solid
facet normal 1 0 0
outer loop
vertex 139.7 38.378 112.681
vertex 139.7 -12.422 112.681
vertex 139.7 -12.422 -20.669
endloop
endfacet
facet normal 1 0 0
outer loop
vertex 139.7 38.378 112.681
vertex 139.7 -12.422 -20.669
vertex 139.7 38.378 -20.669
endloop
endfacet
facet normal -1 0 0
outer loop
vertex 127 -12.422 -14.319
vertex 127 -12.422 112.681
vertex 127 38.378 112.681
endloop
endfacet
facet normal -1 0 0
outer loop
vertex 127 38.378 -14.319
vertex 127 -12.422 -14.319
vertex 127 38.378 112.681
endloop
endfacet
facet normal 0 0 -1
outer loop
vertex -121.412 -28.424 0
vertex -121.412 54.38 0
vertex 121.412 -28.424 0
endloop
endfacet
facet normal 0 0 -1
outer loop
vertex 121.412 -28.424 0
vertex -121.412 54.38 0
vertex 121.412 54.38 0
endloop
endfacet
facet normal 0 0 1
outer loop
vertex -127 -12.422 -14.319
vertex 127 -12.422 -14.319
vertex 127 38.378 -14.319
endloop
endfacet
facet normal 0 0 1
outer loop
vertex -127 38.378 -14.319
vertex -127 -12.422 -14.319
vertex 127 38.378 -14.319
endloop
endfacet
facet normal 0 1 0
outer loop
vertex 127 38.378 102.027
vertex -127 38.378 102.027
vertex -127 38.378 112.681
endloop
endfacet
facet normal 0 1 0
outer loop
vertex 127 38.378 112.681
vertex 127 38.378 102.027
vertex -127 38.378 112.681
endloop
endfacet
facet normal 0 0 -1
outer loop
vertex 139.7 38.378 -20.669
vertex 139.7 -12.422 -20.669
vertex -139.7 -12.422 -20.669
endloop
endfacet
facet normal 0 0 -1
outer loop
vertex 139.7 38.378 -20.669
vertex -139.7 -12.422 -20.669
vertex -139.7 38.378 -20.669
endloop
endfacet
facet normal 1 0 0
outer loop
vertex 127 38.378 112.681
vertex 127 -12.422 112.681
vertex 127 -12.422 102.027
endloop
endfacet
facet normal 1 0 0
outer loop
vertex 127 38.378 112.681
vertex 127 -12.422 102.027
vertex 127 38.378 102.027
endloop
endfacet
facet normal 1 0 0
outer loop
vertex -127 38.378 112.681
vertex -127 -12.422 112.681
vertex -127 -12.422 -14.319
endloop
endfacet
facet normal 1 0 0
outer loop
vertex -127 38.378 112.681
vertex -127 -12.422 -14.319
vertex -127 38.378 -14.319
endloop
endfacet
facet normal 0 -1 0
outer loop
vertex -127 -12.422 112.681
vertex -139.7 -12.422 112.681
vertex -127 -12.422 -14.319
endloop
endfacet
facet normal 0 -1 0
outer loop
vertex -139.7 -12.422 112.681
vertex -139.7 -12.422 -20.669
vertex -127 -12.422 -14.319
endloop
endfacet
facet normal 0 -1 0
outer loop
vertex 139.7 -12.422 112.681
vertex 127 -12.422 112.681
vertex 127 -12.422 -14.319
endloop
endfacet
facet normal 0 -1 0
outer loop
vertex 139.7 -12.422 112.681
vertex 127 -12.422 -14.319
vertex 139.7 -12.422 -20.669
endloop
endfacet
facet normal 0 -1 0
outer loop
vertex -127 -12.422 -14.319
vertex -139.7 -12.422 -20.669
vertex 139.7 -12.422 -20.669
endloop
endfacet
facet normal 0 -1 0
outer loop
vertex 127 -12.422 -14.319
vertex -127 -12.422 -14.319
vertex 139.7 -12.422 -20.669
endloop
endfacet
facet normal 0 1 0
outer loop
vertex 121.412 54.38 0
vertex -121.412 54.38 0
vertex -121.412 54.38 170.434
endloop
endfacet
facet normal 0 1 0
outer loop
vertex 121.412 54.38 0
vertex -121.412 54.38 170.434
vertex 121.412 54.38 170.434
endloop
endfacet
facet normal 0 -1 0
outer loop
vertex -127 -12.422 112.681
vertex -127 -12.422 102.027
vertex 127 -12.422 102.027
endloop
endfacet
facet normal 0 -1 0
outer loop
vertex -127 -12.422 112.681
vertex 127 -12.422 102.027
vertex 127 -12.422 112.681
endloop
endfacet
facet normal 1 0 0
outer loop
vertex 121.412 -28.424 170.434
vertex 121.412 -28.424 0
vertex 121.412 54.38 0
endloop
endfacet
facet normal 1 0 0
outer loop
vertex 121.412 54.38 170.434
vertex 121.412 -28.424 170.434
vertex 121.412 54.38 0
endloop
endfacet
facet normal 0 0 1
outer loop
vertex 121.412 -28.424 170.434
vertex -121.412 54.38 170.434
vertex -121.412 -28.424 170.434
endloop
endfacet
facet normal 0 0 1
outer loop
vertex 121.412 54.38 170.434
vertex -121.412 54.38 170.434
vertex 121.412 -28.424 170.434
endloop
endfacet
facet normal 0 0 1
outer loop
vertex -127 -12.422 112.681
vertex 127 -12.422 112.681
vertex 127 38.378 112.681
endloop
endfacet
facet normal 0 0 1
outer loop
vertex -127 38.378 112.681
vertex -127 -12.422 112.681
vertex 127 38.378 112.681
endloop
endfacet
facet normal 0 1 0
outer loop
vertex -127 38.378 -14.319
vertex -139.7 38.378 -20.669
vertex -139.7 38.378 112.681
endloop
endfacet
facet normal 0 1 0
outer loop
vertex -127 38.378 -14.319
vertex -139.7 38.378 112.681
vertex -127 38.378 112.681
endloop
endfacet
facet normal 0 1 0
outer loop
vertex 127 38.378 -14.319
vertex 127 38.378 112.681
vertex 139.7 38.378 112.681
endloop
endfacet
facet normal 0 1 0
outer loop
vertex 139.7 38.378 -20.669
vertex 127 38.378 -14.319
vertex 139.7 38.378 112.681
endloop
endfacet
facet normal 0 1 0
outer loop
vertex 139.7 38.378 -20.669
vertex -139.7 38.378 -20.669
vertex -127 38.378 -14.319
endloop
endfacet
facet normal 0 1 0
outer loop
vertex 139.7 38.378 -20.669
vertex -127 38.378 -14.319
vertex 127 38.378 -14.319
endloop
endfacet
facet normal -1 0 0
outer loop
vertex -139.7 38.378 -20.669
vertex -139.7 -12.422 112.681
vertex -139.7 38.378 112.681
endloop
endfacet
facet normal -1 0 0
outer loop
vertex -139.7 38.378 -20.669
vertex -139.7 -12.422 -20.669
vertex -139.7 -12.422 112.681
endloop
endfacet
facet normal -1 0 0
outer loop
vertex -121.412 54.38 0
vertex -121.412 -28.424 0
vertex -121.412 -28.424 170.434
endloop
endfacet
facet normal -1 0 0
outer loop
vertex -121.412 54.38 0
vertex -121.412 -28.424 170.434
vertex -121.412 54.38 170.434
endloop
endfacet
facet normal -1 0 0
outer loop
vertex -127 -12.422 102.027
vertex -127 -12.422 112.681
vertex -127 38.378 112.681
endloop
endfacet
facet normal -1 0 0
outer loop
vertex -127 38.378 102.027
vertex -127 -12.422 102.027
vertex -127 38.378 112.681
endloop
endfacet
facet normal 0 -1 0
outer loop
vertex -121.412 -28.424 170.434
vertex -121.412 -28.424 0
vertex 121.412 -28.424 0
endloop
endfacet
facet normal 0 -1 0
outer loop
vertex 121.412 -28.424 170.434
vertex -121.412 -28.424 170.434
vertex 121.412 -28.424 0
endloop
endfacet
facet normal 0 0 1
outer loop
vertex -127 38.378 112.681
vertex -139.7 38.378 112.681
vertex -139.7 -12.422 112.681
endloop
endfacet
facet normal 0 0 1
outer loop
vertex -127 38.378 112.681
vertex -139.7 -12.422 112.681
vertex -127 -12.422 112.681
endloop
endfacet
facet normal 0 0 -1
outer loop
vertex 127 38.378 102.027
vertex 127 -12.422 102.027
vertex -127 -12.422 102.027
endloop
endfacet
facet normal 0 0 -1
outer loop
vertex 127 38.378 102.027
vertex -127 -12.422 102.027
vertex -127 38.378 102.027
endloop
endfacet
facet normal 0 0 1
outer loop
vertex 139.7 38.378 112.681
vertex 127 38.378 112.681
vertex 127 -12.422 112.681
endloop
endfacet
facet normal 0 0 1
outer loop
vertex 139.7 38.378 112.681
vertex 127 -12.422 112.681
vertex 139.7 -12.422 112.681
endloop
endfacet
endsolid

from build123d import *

# Parameters (mm, degrees)
F0_W     = 242.824
F0_H     = 82.804
F1_DEPTH = 170.434
F2_W     = 50.8
F2_H     = 6.35
F3_DEPTH = 139.7
F4_W     = 12.7
F4_H     = 50.8
F5_DEPTH = 127
F6_W     = 50.8
F6_H     = 10.654126
F7_DEPTH = 254


with BuildPart() as f1:
    # F0 (on Top) → F1 (new body)
    with BuildSketch(Plane.XY):
        with Locations((0, 12.977807)):
            Rectangle(F0_W, F0_H)
    extrude(amount=F1_DEPTH)


with BuildPart() as f3:
    # F2 (on Right) → F3 (new body, symmetric)
    with BuildSketch(Plane.YZ):
        with Locations((12.977807, -17.49383)):
            Rectangle(F2_W, F2_H)
    extrude(amount=F3_DEPTH, both=True)

    # F4 (on face) → F5 (join)
    with BuildSketch(Plane.XY.offset(-14.31883)):
        with Locations((-133.35, 12.977807)):
            Rectangle(F4_W, F4_H)
        with Locations((133.35, 12.977807)):
            Rectangle(F4_W, F4_H)
    extrude(amount=F5_DEPTH)


with BuildPart() as f7:
    # F6 (on face) → F7 (new body)
    with BuildSketch(Plane.YZ.offset(-127)):
        with Locations((12.977807, 107.354107)):
            Rectangle(F6_W, F6_H)
    extrude(amount=F7_DEPTH)


solid = Compound([f1.part, f3.part, f7.part])
